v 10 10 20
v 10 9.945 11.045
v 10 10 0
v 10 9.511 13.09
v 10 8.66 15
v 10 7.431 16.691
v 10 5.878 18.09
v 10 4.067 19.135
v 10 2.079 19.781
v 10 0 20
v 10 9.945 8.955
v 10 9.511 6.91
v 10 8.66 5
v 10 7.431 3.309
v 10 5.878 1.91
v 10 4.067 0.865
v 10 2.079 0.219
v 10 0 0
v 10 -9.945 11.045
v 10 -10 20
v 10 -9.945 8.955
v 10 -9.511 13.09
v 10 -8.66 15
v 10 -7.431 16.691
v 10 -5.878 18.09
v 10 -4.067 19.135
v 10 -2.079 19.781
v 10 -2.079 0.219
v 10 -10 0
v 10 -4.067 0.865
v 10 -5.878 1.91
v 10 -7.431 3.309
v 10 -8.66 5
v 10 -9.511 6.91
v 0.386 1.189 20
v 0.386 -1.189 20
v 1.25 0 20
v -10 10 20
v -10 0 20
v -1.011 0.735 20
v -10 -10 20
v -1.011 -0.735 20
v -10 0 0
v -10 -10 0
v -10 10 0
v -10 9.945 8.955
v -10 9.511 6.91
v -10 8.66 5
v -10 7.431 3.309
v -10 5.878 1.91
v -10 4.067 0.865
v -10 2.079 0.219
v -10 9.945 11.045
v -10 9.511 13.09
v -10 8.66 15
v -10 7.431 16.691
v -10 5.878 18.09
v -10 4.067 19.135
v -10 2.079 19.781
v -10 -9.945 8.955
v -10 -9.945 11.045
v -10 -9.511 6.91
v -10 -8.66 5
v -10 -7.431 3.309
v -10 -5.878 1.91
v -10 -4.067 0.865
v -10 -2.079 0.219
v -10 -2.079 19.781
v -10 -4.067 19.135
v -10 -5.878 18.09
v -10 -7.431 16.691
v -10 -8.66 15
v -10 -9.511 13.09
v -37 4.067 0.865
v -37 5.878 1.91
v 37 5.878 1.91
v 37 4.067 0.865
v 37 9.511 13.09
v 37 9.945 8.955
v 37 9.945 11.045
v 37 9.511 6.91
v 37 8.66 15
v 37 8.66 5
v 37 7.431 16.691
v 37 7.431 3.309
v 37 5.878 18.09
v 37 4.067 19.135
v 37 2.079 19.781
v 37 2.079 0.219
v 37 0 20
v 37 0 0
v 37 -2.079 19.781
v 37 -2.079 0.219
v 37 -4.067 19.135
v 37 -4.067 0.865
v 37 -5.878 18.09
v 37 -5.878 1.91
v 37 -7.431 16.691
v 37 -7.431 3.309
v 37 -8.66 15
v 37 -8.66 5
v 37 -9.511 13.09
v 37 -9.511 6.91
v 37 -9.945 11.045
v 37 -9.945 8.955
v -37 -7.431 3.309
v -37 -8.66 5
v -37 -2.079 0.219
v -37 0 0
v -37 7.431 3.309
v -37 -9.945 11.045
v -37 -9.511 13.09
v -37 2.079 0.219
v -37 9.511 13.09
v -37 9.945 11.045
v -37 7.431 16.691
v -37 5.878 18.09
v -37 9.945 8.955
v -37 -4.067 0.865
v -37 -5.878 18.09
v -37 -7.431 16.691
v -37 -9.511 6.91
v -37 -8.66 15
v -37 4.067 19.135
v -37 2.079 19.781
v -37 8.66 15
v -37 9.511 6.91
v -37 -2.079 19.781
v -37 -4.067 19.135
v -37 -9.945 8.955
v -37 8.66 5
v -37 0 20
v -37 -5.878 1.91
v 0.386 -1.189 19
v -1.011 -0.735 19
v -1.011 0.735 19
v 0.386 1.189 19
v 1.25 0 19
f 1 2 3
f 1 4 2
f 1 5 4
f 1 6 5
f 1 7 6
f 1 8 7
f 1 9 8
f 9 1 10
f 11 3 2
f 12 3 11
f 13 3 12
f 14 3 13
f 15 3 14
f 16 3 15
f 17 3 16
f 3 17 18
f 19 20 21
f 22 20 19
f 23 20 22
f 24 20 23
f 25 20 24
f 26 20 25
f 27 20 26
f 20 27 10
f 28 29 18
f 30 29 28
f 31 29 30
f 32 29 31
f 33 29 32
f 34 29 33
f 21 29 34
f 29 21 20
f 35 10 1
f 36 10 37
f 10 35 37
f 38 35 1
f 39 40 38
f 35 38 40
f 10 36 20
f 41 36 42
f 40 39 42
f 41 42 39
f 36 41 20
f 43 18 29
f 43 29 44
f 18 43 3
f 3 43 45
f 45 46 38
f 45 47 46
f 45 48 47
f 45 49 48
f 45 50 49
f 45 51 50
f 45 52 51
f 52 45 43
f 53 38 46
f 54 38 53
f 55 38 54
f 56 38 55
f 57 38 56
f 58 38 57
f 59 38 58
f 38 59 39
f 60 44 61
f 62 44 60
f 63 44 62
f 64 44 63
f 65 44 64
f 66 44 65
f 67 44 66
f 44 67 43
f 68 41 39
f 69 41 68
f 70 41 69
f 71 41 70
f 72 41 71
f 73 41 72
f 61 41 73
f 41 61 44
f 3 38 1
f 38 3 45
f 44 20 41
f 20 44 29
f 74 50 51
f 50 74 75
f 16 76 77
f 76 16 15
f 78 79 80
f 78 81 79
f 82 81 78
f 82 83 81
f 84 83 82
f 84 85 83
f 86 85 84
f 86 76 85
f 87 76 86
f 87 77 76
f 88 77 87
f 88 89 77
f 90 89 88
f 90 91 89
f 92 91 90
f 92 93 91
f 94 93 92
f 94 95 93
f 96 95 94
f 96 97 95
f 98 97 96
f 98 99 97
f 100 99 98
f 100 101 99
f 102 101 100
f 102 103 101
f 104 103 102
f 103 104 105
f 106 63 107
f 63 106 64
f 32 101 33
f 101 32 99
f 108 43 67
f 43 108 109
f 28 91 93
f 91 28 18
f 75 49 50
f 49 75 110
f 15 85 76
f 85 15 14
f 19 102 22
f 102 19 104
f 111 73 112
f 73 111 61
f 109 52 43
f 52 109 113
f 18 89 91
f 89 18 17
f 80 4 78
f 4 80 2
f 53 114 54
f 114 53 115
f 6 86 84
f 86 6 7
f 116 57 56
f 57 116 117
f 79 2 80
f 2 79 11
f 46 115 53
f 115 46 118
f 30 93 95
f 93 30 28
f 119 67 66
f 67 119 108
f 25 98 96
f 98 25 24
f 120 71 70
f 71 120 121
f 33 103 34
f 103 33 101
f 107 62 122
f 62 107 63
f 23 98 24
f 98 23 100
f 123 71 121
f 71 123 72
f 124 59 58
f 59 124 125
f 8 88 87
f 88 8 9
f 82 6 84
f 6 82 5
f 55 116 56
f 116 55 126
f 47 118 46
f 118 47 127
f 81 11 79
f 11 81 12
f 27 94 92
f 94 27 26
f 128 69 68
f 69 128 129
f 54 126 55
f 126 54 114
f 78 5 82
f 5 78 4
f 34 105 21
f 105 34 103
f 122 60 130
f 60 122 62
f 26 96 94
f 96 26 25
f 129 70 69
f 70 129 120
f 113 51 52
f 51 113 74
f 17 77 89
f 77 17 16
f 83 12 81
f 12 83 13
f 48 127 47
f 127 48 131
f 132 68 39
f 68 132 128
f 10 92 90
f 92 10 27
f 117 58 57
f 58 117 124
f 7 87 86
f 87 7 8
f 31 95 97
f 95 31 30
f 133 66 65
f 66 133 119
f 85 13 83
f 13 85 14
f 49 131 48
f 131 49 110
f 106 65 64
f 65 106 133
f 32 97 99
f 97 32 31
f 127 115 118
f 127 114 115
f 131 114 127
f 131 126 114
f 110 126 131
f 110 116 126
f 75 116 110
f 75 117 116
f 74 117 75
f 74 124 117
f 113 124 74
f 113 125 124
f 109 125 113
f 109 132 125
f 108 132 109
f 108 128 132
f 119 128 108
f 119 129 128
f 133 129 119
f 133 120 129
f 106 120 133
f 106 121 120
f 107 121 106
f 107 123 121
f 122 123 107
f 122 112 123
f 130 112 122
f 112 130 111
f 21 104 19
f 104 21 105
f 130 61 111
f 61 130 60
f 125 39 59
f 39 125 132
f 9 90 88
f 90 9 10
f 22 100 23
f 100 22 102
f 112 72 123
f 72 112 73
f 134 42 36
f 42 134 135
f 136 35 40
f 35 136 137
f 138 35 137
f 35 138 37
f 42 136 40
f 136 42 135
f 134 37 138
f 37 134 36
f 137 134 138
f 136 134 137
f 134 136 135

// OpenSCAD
cube_size = 20; // [10:Small,20:Medium,30:Large]

hole_diameter = 2.5; 
hole_radius = hole_diameter/2;

// How deep should the center hole be?
hole_depth = 1; // [0,1,5,50]

show_wheels = "yes"; // [yes,no]

// How thick should the side wheels be?
wheel_thickness = 27; // [1:40]

// ignore this variable!
// foo=1;

// don't turn functions into params!
function BEZ03(u) = pow((1-u), 3);

// ignore variable values
bing = 3+4;
baz = 3 / hole_depth;

difference() {
  union() {
    translate([0, 0, cube_size/2]) cube([cube_size,cube_size,cube_size], center=true);
    if (show_wheels == "yes") {
      translate([0, 0, cube_size/2]) rotate([0, 90, 0]) {
        cylinder(r=cube_size/2, h=cube_size+(wheel_thickness*2), center=true);
      }
    }
  }
  translate([0, 0, cube_size-hole_depth]) cylinder(r=hole_radius, h=hole_depth);
}
        
